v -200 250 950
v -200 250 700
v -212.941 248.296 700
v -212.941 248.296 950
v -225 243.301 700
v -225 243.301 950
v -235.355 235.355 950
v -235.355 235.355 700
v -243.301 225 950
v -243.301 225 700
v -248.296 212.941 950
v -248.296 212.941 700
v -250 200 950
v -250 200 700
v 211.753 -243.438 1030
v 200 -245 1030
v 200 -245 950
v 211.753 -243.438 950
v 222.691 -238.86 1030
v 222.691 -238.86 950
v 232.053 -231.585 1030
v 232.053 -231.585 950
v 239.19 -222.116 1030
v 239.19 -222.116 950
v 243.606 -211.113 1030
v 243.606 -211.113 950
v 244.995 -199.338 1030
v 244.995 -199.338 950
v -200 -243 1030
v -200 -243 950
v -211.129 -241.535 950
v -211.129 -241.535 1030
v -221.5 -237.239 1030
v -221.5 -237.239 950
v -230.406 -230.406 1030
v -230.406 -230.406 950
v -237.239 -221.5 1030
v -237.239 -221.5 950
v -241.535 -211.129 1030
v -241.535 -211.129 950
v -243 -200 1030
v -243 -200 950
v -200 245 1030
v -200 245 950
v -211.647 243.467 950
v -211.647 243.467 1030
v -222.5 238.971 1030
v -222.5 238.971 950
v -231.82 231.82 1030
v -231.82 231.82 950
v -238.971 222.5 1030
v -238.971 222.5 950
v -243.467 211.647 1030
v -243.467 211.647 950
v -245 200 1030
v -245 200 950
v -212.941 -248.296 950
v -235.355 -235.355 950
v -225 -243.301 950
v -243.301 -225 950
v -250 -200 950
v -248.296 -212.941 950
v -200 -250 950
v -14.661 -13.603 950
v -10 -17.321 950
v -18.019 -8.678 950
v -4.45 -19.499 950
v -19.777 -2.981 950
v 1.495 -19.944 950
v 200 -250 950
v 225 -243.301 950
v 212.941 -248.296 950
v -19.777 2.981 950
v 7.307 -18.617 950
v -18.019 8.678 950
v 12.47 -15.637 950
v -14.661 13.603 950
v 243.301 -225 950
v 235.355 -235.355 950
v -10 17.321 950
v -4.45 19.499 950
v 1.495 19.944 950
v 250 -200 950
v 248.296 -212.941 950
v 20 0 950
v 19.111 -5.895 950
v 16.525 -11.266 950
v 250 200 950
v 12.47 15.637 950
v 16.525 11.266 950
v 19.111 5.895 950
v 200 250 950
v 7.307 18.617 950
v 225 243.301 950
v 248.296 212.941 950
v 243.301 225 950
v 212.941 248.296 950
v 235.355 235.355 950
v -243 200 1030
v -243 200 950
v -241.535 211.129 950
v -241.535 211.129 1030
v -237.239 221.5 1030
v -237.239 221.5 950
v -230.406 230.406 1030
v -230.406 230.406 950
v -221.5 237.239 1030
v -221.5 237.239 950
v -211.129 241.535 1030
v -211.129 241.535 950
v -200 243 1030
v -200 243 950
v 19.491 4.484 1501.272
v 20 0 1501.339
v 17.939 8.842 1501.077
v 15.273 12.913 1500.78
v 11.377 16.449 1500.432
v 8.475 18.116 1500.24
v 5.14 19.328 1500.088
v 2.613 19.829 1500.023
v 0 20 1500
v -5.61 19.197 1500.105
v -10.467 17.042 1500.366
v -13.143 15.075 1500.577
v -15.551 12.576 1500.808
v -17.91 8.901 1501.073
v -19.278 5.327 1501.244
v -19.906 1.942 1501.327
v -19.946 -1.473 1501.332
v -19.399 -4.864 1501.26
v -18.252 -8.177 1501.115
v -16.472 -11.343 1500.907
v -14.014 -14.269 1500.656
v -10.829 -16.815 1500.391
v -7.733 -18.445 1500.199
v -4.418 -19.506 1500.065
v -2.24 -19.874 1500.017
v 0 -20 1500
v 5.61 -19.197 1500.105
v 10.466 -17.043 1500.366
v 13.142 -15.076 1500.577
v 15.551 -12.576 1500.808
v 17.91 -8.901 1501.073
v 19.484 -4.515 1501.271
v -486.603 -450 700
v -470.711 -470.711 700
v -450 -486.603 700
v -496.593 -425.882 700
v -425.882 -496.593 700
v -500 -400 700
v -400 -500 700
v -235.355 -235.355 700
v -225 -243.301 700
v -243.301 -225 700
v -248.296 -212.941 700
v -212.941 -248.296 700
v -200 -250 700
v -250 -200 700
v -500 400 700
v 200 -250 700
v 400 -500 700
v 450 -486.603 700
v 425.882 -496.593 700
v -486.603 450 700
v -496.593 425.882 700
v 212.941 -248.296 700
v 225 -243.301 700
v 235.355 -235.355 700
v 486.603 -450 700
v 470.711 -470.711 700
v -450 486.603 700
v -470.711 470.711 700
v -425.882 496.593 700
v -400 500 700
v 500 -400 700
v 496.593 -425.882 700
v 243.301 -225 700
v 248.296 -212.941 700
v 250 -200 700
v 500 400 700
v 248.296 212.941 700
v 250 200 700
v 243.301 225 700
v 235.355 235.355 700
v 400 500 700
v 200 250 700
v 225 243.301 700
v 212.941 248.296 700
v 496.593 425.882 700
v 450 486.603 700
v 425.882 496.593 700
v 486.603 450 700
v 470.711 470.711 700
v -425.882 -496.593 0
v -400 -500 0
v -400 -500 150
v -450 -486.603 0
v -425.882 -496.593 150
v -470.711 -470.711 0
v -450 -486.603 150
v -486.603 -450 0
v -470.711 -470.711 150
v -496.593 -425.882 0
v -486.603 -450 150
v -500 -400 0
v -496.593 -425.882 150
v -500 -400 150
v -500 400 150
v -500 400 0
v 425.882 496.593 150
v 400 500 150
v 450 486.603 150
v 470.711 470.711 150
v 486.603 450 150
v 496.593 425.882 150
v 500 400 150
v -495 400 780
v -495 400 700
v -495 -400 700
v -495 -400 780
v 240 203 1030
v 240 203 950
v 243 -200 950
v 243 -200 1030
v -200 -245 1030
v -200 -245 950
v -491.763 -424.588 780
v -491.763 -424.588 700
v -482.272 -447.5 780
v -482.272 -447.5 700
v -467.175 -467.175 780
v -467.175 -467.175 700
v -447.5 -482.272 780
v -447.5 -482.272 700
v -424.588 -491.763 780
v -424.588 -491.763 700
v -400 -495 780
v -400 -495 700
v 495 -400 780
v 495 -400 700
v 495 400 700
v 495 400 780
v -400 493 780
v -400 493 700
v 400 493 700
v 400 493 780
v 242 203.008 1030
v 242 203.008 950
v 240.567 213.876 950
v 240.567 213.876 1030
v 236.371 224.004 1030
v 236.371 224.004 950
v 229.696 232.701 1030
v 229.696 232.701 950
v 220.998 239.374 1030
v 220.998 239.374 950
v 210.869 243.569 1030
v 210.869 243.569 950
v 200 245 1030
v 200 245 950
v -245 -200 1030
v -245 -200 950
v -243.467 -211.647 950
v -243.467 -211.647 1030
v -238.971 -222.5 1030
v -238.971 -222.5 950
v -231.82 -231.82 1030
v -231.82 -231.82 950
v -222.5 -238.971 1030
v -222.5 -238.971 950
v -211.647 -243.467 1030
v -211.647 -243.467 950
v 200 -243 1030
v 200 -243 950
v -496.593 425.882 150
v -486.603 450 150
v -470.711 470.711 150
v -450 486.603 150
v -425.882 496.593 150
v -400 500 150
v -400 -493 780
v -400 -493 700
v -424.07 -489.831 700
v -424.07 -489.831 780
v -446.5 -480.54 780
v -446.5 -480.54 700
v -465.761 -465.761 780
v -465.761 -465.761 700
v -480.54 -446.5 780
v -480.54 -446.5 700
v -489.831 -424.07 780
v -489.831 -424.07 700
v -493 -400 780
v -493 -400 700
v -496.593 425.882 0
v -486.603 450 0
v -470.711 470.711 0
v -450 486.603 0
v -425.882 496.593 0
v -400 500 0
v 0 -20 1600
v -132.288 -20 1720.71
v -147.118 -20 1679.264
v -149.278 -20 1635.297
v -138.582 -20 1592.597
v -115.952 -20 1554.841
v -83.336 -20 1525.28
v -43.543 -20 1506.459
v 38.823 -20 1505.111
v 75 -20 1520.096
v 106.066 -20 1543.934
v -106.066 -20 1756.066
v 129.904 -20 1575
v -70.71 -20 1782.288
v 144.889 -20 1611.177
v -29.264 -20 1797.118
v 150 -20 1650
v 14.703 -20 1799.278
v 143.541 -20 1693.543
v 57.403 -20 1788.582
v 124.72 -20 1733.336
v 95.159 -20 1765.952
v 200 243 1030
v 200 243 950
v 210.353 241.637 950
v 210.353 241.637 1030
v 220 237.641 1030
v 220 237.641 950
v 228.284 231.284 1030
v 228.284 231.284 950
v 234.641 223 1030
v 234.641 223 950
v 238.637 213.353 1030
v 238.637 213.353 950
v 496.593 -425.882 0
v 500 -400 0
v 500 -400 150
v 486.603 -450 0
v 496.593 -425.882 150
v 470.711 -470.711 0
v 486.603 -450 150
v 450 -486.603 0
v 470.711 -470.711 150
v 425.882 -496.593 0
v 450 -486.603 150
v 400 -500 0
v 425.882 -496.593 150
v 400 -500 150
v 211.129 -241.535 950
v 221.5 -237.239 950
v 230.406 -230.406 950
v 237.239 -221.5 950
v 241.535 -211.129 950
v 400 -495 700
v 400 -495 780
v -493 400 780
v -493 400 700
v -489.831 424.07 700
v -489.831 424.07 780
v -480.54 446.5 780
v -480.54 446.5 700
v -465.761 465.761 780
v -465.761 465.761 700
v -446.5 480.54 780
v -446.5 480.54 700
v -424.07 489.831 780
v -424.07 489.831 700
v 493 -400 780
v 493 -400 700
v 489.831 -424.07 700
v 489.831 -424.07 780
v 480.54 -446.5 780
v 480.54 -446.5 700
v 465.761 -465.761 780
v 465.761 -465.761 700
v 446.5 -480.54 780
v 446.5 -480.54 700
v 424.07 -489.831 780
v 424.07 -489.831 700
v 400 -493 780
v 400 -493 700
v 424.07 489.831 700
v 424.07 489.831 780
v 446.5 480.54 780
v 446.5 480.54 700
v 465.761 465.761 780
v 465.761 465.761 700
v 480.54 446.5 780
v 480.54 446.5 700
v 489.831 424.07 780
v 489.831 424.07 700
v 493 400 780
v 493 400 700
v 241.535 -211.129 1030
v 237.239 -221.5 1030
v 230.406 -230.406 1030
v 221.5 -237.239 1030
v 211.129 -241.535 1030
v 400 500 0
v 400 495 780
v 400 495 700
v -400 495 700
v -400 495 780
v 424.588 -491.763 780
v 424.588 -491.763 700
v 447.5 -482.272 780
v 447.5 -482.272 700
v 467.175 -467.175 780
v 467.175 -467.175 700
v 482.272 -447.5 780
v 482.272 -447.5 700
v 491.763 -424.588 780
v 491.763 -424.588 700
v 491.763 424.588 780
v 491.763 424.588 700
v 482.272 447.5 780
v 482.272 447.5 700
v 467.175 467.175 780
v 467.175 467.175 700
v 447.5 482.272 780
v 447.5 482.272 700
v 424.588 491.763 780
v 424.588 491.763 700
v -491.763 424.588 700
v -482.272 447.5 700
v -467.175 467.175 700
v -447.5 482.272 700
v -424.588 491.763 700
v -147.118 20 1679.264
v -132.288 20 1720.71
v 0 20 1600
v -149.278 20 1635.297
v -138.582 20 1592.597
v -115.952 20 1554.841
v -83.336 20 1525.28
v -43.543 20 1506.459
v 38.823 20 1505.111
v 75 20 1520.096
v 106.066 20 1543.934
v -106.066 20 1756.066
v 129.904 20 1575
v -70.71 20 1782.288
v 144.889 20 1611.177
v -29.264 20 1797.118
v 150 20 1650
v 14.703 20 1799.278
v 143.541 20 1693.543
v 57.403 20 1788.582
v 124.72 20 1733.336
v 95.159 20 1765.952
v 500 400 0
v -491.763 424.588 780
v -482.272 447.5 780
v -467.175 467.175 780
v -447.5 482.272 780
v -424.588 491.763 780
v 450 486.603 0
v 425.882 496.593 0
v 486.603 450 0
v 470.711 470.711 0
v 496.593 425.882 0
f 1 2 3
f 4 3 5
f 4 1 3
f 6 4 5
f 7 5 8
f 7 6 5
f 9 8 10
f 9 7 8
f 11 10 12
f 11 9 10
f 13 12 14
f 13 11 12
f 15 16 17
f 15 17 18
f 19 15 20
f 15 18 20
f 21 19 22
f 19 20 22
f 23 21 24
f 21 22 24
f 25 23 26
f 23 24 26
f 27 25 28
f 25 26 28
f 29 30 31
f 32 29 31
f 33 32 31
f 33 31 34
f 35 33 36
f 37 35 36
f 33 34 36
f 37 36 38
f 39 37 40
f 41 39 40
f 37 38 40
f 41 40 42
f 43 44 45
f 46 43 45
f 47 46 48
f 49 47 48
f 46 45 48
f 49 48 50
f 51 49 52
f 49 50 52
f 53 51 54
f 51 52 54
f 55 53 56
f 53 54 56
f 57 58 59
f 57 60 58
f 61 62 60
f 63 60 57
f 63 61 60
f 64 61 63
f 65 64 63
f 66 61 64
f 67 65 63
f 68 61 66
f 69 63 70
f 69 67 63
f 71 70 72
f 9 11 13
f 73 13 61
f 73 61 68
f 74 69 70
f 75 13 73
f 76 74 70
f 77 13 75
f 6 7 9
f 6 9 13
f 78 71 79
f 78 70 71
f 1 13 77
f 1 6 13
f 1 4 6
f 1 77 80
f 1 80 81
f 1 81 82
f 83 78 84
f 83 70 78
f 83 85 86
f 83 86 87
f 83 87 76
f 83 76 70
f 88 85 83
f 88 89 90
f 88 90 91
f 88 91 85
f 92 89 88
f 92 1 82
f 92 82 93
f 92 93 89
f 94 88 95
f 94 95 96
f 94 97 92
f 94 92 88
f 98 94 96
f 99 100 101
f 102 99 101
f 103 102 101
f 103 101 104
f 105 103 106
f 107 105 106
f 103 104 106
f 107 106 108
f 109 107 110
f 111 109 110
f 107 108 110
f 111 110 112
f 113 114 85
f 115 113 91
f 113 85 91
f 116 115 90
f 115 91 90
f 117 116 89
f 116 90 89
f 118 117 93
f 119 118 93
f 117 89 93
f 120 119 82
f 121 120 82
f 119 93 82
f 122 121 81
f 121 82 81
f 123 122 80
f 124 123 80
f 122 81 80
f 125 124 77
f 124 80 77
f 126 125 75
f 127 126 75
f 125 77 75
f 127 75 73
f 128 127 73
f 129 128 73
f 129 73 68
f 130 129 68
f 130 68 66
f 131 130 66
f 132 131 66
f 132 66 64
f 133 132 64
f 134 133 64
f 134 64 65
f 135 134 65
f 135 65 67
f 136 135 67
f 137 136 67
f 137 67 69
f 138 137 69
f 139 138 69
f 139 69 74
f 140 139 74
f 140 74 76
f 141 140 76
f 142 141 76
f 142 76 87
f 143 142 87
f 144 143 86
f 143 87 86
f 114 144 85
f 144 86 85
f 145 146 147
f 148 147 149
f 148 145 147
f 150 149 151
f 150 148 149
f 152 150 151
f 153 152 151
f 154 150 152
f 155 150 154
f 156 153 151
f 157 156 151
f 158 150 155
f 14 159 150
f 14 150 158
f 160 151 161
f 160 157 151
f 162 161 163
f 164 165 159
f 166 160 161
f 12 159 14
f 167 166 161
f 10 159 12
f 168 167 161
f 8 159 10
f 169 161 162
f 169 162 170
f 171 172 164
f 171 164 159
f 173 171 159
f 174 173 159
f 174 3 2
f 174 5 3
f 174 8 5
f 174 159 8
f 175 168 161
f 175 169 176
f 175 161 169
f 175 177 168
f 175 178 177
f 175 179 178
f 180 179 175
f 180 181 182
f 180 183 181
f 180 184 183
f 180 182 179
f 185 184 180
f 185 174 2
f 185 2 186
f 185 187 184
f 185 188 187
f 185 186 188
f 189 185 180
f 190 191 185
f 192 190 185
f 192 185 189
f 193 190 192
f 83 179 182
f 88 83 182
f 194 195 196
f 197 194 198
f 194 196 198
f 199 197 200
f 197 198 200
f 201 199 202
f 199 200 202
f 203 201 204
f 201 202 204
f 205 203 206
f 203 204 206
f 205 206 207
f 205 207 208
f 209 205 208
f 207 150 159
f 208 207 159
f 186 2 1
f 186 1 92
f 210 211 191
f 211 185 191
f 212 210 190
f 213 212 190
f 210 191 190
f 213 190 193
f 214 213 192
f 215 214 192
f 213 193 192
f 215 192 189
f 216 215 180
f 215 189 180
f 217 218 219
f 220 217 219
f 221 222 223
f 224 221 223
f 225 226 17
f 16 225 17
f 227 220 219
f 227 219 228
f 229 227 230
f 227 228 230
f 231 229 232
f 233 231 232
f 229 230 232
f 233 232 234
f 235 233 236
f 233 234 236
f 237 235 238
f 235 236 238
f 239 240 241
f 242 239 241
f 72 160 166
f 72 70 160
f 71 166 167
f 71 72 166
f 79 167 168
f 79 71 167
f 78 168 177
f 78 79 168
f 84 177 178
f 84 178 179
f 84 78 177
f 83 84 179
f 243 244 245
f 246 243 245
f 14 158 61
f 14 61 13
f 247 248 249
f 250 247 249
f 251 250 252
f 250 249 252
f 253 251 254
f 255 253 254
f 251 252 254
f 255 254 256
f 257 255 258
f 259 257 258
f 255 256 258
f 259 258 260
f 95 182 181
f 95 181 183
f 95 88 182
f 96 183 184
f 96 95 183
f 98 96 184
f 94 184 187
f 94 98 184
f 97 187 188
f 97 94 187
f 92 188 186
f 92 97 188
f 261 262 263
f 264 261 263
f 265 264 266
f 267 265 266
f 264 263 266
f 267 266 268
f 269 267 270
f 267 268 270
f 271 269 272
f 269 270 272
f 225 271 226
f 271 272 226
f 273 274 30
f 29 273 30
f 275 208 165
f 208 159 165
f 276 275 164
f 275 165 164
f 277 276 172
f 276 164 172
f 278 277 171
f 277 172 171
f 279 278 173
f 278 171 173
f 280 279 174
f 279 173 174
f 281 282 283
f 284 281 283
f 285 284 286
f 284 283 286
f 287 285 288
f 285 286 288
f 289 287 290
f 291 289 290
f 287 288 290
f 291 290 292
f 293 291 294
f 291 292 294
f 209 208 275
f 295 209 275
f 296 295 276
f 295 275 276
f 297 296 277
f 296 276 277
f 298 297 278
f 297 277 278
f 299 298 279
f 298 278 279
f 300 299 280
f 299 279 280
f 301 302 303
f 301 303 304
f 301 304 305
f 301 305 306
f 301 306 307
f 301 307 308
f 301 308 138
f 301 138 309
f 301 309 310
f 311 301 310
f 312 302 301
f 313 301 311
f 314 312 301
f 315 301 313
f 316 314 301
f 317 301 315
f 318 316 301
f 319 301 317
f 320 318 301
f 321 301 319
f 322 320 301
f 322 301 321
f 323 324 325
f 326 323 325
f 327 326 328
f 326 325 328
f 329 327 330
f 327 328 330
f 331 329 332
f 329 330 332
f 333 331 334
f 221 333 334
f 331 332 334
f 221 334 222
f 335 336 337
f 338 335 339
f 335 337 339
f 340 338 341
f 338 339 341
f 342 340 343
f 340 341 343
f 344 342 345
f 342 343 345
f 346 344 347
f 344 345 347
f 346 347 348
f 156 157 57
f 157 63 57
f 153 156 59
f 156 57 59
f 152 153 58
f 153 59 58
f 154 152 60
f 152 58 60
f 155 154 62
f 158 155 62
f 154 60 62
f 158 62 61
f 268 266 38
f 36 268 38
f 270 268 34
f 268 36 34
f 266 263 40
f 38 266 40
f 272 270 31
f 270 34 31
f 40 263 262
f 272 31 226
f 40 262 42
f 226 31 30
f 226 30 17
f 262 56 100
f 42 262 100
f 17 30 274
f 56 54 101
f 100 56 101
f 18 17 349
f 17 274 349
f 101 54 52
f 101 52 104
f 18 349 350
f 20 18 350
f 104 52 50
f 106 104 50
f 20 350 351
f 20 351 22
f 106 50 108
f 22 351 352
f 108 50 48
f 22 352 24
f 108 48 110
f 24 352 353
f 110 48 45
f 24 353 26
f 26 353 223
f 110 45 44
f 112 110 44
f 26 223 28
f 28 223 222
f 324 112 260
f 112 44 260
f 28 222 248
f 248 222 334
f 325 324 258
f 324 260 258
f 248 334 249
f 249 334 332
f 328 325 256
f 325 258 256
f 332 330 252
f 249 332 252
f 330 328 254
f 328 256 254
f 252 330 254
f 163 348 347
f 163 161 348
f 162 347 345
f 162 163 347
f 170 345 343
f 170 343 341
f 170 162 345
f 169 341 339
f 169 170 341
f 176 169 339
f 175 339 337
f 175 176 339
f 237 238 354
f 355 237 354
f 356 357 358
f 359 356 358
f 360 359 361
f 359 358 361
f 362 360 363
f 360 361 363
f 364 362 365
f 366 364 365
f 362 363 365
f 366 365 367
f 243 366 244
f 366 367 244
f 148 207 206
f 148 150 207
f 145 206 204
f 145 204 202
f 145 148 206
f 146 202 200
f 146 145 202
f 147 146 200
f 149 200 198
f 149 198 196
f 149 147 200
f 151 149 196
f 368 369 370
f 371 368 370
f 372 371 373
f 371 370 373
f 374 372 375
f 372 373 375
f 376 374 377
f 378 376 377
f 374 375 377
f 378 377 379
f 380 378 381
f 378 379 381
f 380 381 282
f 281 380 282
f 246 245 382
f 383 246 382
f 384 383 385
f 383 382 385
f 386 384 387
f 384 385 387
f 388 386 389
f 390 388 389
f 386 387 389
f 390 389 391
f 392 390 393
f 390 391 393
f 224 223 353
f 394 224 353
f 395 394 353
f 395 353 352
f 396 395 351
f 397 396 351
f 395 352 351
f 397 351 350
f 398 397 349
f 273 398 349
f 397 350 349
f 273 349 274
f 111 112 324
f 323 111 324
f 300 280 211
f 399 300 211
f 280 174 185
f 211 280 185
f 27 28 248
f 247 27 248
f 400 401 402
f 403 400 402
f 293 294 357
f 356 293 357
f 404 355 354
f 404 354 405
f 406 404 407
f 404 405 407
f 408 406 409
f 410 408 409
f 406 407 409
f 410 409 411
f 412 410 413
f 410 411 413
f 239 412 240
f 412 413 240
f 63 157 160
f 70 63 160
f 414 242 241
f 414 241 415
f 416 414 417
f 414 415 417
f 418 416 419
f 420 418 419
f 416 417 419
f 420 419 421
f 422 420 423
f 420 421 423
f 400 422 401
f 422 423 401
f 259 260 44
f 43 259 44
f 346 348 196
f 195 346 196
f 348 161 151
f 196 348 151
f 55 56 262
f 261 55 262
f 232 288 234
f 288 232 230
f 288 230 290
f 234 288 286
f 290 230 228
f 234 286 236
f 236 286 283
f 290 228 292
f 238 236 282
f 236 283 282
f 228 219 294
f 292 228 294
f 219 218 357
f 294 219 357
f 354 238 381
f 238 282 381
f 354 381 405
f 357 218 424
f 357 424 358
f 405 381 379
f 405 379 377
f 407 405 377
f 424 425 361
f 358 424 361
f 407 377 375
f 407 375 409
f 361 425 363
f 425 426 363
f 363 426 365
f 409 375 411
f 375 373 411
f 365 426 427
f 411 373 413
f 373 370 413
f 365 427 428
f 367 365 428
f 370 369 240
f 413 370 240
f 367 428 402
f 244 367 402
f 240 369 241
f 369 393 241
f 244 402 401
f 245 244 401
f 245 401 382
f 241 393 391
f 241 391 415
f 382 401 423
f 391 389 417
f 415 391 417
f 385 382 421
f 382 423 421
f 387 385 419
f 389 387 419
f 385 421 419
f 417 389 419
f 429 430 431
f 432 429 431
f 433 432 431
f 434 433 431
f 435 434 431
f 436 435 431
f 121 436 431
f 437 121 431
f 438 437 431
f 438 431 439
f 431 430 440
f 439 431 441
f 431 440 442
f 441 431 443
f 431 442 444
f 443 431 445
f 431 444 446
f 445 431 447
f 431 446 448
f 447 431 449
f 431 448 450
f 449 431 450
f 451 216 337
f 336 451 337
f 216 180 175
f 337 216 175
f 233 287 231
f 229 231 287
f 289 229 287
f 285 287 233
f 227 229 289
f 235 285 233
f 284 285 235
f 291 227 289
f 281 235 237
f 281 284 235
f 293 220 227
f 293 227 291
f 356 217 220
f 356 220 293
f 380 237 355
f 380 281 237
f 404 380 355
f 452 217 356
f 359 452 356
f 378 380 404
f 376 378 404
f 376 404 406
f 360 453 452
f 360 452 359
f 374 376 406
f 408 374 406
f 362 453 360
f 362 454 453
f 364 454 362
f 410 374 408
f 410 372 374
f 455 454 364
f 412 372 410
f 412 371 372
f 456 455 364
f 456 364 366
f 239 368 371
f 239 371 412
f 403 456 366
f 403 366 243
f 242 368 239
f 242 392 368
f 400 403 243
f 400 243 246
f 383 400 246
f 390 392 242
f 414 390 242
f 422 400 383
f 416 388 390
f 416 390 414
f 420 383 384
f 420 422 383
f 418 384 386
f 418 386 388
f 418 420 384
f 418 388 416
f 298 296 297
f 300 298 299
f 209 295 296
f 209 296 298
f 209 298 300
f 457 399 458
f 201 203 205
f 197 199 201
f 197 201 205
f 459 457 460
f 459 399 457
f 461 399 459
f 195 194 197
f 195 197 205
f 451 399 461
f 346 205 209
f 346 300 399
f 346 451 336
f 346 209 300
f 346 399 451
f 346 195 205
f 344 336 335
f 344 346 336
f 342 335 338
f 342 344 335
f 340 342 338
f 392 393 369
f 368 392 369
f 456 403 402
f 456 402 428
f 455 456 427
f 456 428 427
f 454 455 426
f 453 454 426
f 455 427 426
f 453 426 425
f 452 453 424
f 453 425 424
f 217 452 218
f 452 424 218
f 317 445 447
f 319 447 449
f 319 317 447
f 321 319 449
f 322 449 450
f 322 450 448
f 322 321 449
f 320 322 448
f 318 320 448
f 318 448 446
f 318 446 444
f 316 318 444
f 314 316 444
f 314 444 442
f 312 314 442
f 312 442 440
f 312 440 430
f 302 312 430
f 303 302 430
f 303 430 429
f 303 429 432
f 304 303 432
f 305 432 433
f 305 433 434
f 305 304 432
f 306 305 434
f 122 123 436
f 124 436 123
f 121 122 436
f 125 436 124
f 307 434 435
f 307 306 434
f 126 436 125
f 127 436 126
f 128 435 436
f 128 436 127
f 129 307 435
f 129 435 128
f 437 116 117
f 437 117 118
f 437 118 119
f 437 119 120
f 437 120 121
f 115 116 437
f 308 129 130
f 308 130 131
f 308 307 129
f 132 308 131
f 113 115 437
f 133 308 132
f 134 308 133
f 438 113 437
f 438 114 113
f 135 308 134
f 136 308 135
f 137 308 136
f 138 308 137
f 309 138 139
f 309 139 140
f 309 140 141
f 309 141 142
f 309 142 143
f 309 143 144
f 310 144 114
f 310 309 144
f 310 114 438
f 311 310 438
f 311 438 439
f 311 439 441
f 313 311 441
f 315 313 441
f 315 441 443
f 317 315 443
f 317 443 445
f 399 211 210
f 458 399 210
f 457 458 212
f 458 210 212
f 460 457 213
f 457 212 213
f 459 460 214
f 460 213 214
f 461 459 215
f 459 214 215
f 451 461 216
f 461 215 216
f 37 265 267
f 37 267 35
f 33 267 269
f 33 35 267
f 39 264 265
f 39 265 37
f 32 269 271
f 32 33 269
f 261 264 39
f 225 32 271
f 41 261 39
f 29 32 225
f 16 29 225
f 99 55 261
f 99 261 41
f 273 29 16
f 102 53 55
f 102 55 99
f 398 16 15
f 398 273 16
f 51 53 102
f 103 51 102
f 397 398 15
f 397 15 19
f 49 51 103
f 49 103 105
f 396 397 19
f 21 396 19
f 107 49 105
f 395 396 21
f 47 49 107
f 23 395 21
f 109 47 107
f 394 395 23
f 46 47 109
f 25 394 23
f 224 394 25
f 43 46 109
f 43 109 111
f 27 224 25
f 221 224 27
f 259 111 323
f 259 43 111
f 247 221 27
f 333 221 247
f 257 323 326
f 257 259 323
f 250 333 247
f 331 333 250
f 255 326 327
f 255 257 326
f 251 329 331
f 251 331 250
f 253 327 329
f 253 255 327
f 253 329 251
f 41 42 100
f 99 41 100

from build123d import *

# Parameters (mm, degrees)
F2_W      = 900
F2_H      = 900
F3_DEPTH  = 150
F4_W      = 1000
F4_H      = 1000
F5_DEPTH  = 550
F6_W      = 500
F6_H      = 500
F7_DEPTH  = 250
F8_R      = 100
F9_R      = 85
F10_R     = 50
F12_DEPTH = 80
F14_DEPTH = 80
F15_R     = 20
F16_DEPTH = 1600
F18_R     = 150
F19_DEPTH = 20
F21_DEPTH = 150


# Not quite as in the source:
# - a feature of the source that left no trace in its solid (it failed there, or was rolled back) is left out


with BuildPart() as f3:
    # F2 (on Top) → F3 (new body, through all)
    with BuildSketch(Plane.XY):
        Rectangle(F2_W, F2_H)
    extrude(amount=F3_DEPTH)

    # F4 (on face) → F5 (join, through all)
    with BuildSketch(Plane.XY.offset(150)):
        Rectangle(F4_W, F4_H)
    extrude(amount=F5_DEPTH)

    # F6 (on face) → F7 (join)
    with BuildSketch(Plane.XY.offset(700)):
        Rectangle(F6_W, F6_H)
    extrude(amount=F7_DEPTH)

    # F8
    f8_edges = [f3.edges().sort_by_distance(p)[0] for p in [
        (500, -500, 425),
        (-500, -500, 425),
        (500, 500, 425),
        (-500, 500, 425),
    ]]
    fillet(f8_edges, radius=F8_R)

    # F9
    f9_edges = [f3.edges().sort_by_distance(p)[0] for p in [
        (-450, 450, 75),
        (-450, -450, 75),
        (450, -450, 75),
        (450, 450, 75),
    ]]
    fillet(f9_edges, radius=F9_R)

    # F10
    f10_edges = [f3.edges().sort_by_distance(p)[0] for p in [
        (-250, -250, 825),
        (250, -250, 825),
        (250, 250, 825),
        (-250, 250, 825),
    ]]
    fillet(f10_edges, radius=F10_R)

    # F15 (on Top) → F16 (join)
    with BuildSketch(Plane.XY):
        Circle(F15_R)
    extrude(amount=F16_DEPTH)

    # F18 (on Front) → F19 (join, symmetric)
    with BuildSketch(Plane.XZ):
        with Locations((0, 1650)):
            Circle(F18_R)
    extrude(amount=F19_DEPTH, both=True)

    # F20 (on face) → F21 (join, through all)
    with BuildSketch(Plane(origin=(0, 0, 150), x_dir=(1, 0, 0), z_dir=(0, 0, -1))):
        with BuildLine():
            Line((400, 500), (-400, 500))
            ThreePointArc((-400, 500), (-470.7106781187, 470.7106781187), (-500, 400))
            Line((-500, 400), (-500, -400))
            ThreePointArc((-500, -400), (-470.7106781187, -470.7106781187), (-400, -500))
            Line((-400, -500), (400, -500))
            ThreePointArc((400, -500), (470.7106781187, -470.7106781187), (500, -400))
            Line((500, -400), (500, 400))
            ThreePointArc((500, 400), (470.7106781187, 470.7106781187), (400, 500))
        make_face()
        with BuildLine():
            ThreePointArc((365, 450), (425.1040764009, 425.1040764009), (450, 365))
            Line((450, 365), (450, -365))
            ThreePointArc((450, -365), (425.1040764009, -425.1040764009), (365, -450))
            Line((365, -450), (-365, -450))
            ThreePointArc((-365, -450), (-425.1040764009, -425.1040764009), (-450, -365))
            Line((-450, -365), (-450, 365))
            ThreePointArc((-450, 365), (-425.1040764009, 425.1040764009), (-365, 450))
            Line((-365, 450), (365, 450))
        make_face(mode=Mode.SUBTRACT)
    extrude(amount=F21_DEPTH)


with BuildPart() as f12:
    # F11 (on face) → F12 (new body)
    with BuildSketch(Plane.XY.offset(700)):
        with BuildLine():
            ThreePointArc((-400, 495), (-467.1751442127, 467.1751442127), (-495, 400))
            Line((-495, 400), (-495, -400))
            ThreePointArc((-495, -400), (-467.1751442127, -467.1751442127), (-400, -495))
            Line((-400, -495), (400, -495))
            ThreePointArc((400, -495), (467.1751442127, -467.1751442127), (495, -400))
            Line((495, -400), (495, 400))
            ThreePointArc((495, 400), (467.1751442127, 467.1751442127), (400, 495))
            Line((400, 495), (-400, 495))
        make_face()
        with BuildLine():
            ThreePointArc((493, -400), (465.7609306503, -465.7609306503), (400, -493))
            Line((400, -493), (-400, -493))
            ThreePointArc((-400, -493), (-465.7609306503, -465.7609306503), (-493, -400))
            Line((-493, -400), (-493, 400))
            ThreePointArc((-493, 400), (-465.7609306503, 465.7609306503), (-400, 493))
            Line((-400, 493), (400, 493))
            ThreePointArc((400, 493), (465.7609306503, 465.7609306503), (493, 400))
            Line((493, 400), (493, -400))
        make_face(mode=Mode.SUBTRACT)
    extrude(amount=F12_DEPTH)


with BuildPart() as f14:
    # F13 (on face) → F14 (new body)
    with BuildSketch(Plane.XY.offset(950)):
        with BuildLine():
            ThreePointArc((242.0000088609, 203.0075300193), (229.6958274631, 232.7011505768), (200, 245.0000047089))
            Line((200, 245.0000047089), (-200, 245.0000047089))
            ThreePointArc((-200, 245.0000047089), (-231.8198084831, 231.8198084831), (-245.0000047089, 200))
            Line((-245.0000047089, 200), (-245.0000047089, -200))
            ThreePointArc((-245.0000047089, -200), (-231.8198084831, -231.8198084831), (-200, -245.0000047089))
            Line((-200, -245.0000047089), (200, -245.0000047089))
            ThreePointArc((200, -245.0000047089), (232.0531499414, -231.5847431942), (244.9951290454, -199.3375907688))
            Line((244.9951290454, -199.3375907688), (242.0000088609, 203.0075300193))
        make_face()
        with BuildLine():
            ThreePointArc((-243.0000047089, 200), (-230.4055949208, 230.4055949208), (-200, 243.0000047089))
            Line((-200, 243.0000047089), (200, 243.0000047089))
            ThreePointArc((200, 243.0000047089), (228.284277991, 231.2842731632), (240.0000095367, 202.9999951722))
            Line((240.0000095367, 202.9999951722), (243.0000047089, -200))
            ThreePointArc((243.0000047089, -200), (230.4055949208, -230.4055949208), (200, -243.0000047089))
            Line((200, -243.0000047089), (-200, -243.0000047089))
            ThreePointArc((-200, -243.0000047089), (-230.4055949208, -230.4055949208), (-243.0000047089, -200))
            Line((-243.0000047089, -200), (-243.0000047089, 200))
        make_face(mode=Mode.SUBTRACT)
    extrude(amount=F14_DEPTH)


solid = Compound([f3.part, f12.part, f14.part])
